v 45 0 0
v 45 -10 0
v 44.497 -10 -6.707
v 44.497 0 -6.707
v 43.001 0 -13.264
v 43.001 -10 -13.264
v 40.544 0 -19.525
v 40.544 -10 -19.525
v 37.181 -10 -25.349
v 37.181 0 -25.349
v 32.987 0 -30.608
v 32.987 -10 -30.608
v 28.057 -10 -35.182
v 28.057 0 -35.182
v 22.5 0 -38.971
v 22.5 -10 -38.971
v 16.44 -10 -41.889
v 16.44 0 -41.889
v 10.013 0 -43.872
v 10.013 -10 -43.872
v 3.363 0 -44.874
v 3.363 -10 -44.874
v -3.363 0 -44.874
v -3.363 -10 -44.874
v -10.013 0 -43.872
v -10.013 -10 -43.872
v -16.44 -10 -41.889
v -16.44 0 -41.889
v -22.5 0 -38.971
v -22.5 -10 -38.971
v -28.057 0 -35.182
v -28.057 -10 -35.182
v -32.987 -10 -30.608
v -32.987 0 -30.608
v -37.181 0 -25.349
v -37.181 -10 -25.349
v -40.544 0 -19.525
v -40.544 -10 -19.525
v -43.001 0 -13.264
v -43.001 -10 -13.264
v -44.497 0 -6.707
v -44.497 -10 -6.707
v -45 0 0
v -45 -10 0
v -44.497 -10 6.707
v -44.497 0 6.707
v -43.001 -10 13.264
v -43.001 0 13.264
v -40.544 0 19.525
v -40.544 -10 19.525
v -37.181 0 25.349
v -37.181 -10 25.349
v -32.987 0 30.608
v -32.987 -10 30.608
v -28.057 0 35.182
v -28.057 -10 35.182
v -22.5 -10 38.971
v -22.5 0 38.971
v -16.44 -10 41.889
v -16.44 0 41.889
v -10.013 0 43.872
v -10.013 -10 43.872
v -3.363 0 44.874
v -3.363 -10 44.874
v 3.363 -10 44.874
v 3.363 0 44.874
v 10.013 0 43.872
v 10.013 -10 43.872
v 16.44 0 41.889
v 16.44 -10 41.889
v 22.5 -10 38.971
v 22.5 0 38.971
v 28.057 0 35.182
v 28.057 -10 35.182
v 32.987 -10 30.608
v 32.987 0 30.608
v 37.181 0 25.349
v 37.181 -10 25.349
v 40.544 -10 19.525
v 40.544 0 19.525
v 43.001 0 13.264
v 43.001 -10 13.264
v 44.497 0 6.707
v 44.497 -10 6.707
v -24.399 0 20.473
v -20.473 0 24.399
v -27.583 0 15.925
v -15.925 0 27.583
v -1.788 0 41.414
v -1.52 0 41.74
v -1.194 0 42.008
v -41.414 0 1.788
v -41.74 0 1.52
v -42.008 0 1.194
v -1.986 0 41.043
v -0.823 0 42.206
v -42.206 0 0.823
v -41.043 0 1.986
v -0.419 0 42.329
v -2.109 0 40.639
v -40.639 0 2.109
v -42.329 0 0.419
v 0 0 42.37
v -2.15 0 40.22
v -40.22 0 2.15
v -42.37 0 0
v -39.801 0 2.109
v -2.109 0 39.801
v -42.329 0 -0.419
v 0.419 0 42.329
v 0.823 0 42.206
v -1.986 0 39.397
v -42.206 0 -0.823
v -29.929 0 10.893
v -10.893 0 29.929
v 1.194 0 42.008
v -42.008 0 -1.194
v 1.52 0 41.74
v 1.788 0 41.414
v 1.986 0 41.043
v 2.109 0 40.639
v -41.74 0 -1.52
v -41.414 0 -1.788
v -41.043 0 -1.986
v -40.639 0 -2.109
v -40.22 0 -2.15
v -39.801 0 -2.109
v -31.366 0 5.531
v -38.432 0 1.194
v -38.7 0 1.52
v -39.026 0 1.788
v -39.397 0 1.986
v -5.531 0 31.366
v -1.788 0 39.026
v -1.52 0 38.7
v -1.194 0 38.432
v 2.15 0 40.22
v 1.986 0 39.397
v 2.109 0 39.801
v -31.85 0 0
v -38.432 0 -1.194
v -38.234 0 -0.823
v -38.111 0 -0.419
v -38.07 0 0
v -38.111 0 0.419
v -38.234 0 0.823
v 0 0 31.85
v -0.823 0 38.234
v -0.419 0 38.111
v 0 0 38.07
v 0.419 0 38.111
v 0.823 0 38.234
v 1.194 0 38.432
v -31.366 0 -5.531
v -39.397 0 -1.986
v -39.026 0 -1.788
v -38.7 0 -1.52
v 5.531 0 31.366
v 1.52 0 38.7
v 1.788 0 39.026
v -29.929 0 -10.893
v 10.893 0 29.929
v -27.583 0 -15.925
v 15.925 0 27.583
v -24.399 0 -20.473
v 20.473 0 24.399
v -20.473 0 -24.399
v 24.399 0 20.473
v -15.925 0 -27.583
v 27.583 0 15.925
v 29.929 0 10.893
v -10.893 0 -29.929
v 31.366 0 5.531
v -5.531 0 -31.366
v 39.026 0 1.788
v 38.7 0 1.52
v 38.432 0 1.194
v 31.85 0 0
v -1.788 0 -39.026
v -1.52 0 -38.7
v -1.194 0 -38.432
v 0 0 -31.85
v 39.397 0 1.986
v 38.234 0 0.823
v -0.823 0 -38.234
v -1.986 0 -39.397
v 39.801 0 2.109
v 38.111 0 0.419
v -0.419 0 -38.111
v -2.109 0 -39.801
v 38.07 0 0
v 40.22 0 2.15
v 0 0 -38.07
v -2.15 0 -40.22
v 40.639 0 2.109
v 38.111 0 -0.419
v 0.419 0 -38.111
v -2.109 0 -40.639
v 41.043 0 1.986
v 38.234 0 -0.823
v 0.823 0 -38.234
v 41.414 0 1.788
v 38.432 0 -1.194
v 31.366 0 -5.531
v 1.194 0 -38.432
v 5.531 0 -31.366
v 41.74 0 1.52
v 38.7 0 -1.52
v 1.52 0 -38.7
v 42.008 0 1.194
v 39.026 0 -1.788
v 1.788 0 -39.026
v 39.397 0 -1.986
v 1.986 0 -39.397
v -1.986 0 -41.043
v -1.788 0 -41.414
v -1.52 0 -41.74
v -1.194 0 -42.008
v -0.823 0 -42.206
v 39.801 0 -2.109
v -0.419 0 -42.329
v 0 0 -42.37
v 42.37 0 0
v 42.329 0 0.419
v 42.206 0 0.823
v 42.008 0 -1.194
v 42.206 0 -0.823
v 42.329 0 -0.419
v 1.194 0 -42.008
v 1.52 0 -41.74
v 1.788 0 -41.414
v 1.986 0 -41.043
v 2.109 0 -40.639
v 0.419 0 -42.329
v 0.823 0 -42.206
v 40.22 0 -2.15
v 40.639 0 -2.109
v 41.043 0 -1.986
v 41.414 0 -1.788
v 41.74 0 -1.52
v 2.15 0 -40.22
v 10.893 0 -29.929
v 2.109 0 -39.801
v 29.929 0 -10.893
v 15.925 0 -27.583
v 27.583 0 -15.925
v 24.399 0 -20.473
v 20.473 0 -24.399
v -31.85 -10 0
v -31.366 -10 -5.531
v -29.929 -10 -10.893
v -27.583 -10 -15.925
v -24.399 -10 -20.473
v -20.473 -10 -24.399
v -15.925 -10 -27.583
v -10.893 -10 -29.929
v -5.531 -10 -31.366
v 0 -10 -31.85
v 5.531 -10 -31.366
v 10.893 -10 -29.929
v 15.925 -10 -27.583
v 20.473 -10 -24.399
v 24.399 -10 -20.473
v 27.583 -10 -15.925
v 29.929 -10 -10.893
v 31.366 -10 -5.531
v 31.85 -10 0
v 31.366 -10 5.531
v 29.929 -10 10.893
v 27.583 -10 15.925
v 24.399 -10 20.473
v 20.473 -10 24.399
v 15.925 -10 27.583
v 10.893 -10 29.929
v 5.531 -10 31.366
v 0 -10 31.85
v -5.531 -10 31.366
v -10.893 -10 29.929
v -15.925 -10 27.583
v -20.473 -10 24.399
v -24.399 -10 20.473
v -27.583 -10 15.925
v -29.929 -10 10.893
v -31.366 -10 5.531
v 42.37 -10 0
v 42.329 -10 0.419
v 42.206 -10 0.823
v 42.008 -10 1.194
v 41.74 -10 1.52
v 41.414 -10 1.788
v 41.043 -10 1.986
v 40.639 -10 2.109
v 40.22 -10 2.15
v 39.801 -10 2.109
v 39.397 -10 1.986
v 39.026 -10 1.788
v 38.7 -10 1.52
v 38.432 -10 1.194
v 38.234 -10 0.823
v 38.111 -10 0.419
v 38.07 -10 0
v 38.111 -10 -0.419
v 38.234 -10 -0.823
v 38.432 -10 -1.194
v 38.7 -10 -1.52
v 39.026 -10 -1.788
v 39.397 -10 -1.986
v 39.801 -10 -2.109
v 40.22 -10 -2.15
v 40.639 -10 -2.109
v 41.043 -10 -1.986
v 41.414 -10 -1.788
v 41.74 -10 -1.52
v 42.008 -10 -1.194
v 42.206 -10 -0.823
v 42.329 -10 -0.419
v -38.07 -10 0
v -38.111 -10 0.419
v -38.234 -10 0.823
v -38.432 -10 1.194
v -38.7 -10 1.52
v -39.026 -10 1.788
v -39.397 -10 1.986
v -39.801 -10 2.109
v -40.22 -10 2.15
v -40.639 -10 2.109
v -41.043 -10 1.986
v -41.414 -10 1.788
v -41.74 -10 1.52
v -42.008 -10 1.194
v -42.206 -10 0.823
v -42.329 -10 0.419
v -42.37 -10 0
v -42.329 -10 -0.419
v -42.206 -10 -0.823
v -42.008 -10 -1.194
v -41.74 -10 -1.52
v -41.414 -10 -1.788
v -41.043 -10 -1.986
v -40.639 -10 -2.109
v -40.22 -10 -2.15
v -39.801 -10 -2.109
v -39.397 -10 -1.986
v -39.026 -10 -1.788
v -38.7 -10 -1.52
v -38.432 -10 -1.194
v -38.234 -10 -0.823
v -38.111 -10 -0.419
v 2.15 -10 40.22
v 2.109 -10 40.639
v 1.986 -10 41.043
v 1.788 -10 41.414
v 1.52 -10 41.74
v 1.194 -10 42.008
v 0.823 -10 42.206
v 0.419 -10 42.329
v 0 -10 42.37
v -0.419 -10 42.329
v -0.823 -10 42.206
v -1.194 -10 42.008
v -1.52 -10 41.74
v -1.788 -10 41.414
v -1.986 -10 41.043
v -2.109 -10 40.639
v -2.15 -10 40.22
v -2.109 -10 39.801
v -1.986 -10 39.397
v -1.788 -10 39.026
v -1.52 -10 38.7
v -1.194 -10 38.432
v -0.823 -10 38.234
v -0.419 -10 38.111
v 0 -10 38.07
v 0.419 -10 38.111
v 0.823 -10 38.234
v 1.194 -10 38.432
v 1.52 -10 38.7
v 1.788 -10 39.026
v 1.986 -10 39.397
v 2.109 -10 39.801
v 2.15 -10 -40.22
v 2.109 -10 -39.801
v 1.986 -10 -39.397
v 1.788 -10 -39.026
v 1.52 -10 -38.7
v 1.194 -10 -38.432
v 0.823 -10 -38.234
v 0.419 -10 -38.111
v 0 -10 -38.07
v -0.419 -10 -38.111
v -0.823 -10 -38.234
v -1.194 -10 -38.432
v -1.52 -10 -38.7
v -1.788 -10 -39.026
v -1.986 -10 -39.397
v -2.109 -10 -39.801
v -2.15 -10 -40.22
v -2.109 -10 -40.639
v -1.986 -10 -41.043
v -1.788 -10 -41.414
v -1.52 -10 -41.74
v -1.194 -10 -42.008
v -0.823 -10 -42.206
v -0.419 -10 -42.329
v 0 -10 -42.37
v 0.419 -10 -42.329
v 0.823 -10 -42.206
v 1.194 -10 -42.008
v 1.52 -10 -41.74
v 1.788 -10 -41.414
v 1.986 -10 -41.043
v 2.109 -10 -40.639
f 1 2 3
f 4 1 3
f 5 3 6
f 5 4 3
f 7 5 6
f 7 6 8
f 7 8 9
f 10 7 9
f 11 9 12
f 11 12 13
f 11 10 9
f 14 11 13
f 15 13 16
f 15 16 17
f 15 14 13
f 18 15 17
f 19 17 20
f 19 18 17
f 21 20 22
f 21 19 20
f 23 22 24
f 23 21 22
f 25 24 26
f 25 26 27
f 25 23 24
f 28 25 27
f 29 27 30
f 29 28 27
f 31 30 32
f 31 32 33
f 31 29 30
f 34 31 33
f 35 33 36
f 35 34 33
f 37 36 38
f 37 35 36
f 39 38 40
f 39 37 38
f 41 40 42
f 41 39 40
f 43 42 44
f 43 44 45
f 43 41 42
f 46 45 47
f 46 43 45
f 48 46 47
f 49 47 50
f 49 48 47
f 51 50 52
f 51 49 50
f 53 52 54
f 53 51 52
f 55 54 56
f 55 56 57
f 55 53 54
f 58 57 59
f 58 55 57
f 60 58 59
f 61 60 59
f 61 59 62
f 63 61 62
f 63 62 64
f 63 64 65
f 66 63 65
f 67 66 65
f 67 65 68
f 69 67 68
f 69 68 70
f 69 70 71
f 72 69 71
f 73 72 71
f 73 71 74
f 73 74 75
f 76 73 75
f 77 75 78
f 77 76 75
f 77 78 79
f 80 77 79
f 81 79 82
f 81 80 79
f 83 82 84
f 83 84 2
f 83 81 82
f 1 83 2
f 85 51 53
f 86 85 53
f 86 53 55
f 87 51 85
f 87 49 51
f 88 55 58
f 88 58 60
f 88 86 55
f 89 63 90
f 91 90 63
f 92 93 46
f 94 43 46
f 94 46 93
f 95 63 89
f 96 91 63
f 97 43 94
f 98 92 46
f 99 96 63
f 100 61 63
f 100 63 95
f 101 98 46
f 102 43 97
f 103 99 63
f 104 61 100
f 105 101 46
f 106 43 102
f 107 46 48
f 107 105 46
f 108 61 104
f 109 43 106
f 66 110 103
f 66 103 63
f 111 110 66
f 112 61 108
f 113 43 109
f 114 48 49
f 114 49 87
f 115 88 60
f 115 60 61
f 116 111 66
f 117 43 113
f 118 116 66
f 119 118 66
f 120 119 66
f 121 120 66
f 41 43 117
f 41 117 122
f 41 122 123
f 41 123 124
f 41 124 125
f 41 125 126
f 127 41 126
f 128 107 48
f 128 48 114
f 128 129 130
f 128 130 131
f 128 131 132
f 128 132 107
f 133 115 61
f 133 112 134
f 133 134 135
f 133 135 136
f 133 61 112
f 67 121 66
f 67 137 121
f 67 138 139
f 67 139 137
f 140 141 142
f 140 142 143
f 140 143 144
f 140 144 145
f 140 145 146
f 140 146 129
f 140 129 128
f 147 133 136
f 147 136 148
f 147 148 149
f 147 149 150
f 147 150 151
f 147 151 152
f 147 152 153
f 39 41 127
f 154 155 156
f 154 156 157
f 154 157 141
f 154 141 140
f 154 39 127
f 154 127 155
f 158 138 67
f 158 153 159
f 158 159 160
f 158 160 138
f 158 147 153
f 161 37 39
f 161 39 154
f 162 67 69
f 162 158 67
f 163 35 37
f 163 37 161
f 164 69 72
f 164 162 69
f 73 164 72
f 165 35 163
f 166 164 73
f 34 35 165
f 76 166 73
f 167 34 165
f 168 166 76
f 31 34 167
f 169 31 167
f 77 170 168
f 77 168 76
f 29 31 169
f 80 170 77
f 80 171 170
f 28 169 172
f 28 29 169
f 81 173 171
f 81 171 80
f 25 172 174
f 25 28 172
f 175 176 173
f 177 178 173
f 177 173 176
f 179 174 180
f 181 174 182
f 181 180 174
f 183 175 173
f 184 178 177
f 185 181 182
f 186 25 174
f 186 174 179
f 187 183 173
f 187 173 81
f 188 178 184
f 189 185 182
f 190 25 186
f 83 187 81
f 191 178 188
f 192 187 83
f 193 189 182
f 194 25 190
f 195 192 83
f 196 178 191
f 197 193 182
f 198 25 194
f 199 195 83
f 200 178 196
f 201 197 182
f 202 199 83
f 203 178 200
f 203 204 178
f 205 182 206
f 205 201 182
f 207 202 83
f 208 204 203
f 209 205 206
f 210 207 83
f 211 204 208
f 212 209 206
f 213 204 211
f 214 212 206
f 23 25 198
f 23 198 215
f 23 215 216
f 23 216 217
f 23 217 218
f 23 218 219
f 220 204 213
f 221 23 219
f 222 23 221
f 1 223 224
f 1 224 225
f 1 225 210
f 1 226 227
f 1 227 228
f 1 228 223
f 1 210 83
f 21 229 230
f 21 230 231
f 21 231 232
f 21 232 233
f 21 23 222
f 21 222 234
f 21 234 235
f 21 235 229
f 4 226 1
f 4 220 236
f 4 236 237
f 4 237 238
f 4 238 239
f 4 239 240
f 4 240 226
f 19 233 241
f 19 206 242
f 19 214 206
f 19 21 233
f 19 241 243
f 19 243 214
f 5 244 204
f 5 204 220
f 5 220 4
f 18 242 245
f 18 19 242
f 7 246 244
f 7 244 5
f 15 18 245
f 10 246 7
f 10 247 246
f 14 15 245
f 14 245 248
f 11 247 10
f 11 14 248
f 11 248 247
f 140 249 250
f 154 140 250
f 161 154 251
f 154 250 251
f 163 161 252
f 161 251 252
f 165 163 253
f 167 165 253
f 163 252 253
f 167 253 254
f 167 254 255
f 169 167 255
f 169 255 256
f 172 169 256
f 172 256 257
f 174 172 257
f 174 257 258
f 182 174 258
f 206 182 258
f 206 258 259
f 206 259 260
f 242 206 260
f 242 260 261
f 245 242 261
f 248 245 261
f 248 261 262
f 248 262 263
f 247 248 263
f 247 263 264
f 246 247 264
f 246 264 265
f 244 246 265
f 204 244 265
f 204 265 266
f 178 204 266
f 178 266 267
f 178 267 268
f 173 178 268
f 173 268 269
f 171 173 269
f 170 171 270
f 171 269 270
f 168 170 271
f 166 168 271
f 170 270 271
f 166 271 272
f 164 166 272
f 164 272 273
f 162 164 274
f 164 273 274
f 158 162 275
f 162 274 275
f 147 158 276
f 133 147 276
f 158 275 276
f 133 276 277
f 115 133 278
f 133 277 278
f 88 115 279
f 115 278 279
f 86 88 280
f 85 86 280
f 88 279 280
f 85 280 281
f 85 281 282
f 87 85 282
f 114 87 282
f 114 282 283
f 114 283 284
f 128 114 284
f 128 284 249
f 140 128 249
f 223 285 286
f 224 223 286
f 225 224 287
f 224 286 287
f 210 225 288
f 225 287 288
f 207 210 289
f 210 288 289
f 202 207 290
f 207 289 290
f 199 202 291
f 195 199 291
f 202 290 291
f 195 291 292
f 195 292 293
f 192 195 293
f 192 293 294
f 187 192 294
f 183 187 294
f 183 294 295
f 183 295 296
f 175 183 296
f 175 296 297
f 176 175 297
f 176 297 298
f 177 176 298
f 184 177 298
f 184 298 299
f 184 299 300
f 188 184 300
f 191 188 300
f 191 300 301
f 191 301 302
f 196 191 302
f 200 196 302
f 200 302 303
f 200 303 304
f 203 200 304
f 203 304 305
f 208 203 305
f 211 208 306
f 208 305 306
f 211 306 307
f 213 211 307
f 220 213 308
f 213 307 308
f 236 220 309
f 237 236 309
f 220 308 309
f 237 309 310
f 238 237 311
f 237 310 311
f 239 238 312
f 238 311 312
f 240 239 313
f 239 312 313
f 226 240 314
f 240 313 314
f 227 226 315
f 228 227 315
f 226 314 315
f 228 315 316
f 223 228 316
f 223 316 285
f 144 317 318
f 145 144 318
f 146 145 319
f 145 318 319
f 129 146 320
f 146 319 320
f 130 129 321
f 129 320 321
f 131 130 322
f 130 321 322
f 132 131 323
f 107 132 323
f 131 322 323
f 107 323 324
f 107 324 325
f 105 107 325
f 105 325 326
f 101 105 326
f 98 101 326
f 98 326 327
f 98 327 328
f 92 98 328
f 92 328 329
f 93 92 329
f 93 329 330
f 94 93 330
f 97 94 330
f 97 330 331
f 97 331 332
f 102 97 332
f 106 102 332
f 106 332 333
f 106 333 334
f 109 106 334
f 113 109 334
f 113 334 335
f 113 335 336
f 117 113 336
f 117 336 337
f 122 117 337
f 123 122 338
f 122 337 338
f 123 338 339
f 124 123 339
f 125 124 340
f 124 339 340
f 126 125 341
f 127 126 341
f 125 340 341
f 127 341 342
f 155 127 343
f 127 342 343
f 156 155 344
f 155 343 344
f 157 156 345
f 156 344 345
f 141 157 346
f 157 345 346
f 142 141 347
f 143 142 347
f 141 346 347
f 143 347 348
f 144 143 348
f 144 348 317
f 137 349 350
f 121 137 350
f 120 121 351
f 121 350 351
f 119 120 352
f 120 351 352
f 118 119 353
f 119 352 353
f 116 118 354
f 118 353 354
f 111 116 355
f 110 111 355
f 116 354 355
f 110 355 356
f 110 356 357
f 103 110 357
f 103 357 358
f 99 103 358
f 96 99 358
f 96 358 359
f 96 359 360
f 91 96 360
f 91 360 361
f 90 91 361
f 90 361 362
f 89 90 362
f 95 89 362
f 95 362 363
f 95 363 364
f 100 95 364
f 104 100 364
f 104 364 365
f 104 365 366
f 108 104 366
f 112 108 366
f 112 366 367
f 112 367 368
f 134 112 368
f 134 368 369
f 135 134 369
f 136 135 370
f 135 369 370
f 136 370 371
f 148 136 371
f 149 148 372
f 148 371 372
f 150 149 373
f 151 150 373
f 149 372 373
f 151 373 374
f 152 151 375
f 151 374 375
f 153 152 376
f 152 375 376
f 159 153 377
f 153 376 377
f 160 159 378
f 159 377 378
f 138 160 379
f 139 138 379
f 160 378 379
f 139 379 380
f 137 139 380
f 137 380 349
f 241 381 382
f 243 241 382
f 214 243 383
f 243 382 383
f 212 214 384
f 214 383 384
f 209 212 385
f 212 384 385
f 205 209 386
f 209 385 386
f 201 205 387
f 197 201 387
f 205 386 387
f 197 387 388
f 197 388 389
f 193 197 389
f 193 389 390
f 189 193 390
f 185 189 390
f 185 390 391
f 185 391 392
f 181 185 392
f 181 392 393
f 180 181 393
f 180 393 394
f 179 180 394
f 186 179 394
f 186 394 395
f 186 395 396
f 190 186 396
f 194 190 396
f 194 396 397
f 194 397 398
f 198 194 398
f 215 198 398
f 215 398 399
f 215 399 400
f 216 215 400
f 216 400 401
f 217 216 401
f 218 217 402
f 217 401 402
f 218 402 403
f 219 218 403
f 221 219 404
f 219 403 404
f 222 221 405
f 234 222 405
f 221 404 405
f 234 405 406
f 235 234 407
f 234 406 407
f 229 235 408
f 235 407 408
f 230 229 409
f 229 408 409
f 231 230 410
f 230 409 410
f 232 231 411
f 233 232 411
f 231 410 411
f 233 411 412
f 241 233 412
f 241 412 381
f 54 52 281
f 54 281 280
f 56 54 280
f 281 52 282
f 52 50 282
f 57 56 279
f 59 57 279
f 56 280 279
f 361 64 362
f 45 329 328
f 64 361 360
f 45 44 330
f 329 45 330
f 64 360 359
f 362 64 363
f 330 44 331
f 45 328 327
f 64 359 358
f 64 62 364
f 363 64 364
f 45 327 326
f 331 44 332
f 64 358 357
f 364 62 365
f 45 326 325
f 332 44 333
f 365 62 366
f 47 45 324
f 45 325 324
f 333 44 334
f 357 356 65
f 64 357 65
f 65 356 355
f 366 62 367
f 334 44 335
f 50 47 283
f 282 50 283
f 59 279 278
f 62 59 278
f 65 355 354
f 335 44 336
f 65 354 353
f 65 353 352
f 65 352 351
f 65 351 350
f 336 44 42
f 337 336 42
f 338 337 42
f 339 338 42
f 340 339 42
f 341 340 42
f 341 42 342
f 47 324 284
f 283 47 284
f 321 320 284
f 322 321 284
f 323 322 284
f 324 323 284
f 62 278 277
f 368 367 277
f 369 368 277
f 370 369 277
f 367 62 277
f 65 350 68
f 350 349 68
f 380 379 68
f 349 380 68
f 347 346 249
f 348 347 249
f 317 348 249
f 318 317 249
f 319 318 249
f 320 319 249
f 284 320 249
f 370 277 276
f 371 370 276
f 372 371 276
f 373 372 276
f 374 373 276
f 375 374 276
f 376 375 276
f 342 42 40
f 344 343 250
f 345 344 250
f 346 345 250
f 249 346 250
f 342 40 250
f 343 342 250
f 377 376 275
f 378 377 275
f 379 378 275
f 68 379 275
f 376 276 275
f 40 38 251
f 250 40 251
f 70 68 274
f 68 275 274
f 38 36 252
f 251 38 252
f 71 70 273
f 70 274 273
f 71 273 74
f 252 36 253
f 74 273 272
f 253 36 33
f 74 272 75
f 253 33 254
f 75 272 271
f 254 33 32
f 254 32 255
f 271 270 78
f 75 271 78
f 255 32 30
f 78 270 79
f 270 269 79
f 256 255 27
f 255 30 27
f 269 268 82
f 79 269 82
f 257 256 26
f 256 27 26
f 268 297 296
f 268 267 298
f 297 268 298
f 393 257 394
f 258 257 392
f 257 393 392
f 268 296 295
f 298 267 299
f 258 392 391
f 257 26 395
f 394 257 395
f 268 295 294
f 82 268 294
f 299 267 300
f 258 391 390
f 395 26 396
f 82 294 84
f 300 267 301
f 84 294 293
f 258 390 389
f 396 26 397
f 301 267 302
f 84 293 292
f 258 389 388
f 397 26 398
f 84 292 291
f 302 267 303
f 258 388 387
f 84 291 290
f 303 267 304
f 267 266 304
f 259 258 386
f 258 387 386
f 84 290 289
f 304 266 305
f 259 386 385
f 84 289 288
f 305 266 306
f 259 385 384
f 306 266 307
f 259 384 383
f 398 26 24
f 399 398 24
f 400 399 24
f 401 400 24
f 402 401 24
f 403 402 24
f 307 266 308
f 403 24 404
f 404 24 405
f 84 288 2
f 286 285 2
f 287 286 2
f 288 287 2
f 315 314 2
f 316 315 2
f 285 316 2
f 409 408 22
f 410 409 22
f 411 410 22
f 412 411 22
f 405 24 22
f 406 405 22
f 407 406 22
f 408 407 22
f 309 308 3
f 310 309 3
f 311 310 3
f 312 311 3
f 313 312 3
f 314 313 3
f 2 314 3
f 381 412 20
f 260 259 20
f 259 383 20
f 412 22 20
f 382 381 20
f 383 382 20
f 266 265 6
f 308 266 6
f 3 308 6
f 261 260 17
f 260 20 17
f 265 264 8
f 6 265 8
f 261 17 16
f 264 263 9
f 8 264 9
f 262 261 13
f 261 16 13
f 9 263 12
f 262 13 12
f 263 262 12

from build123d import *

# Parameters (mm, degrees)
SKETCH2_R               = 45
BOSS_EXTRUDE1_DEPTH     = 10
SKETCH7_R               = 31.85
CUT_EXTRUDE1_DEPTH      = 1
CUT_EXTRUDE1_DEPTH_BACK = 11
SKETCH8_R               = 2.15
CUT_EXTRUDE2_DEPTH      = 11


with BuildPart() as part:
    # Sketch2 → Boss-Extrude1 (new body)
    with BuildSketch(Plane(origin=(0, 0, 0), x_dir=(1, 0, 0), z_dir=(0, 1, 0))):
        Circle(SKETCH2_R)
    extrude(amount=-BOSS_EXTRUDE1_DEPTH)

    # Sketch7 → Cut-Extrude1 (cut, two sides)
    with BuildSketch(Plane(origin=(0, -10, 0), x_dir=(-1, 0, 0), z_dir=(0, -1, 0))) as cut_extrude1_sk:
        Circle(SKETCH7_R)
    extrude(amount=CUT_EXTRUDE1_DEPTH, mode=Mode.SUBTRACT)
    extrude(cut_extrude1_sk.sketch, amount=-CUT_EXTRUDE1_DEPTH_BACK, mode=Mode.SUBTRACT)

    # Sketch8 → Cut-Extrude2 (cut, through all)
    with BuildSketch(Plane.XZ.offset(10)):
        with Locations((-40.22, 0)):
            Circle(SKETCH8_R)
        with Locations((0, -40.22)):
            Circle(SKETCH8_R)
        with Locations((0, 40.22)):
            Circle(SKETCH8_R)
        with Locations((40.22, 0)):
            Circle(SKETCH8_R)
    extrude(amount=-CUT_EXTRUDE2_DEPTH, mode=Mode.SUBTRACT)


solid = part.part
